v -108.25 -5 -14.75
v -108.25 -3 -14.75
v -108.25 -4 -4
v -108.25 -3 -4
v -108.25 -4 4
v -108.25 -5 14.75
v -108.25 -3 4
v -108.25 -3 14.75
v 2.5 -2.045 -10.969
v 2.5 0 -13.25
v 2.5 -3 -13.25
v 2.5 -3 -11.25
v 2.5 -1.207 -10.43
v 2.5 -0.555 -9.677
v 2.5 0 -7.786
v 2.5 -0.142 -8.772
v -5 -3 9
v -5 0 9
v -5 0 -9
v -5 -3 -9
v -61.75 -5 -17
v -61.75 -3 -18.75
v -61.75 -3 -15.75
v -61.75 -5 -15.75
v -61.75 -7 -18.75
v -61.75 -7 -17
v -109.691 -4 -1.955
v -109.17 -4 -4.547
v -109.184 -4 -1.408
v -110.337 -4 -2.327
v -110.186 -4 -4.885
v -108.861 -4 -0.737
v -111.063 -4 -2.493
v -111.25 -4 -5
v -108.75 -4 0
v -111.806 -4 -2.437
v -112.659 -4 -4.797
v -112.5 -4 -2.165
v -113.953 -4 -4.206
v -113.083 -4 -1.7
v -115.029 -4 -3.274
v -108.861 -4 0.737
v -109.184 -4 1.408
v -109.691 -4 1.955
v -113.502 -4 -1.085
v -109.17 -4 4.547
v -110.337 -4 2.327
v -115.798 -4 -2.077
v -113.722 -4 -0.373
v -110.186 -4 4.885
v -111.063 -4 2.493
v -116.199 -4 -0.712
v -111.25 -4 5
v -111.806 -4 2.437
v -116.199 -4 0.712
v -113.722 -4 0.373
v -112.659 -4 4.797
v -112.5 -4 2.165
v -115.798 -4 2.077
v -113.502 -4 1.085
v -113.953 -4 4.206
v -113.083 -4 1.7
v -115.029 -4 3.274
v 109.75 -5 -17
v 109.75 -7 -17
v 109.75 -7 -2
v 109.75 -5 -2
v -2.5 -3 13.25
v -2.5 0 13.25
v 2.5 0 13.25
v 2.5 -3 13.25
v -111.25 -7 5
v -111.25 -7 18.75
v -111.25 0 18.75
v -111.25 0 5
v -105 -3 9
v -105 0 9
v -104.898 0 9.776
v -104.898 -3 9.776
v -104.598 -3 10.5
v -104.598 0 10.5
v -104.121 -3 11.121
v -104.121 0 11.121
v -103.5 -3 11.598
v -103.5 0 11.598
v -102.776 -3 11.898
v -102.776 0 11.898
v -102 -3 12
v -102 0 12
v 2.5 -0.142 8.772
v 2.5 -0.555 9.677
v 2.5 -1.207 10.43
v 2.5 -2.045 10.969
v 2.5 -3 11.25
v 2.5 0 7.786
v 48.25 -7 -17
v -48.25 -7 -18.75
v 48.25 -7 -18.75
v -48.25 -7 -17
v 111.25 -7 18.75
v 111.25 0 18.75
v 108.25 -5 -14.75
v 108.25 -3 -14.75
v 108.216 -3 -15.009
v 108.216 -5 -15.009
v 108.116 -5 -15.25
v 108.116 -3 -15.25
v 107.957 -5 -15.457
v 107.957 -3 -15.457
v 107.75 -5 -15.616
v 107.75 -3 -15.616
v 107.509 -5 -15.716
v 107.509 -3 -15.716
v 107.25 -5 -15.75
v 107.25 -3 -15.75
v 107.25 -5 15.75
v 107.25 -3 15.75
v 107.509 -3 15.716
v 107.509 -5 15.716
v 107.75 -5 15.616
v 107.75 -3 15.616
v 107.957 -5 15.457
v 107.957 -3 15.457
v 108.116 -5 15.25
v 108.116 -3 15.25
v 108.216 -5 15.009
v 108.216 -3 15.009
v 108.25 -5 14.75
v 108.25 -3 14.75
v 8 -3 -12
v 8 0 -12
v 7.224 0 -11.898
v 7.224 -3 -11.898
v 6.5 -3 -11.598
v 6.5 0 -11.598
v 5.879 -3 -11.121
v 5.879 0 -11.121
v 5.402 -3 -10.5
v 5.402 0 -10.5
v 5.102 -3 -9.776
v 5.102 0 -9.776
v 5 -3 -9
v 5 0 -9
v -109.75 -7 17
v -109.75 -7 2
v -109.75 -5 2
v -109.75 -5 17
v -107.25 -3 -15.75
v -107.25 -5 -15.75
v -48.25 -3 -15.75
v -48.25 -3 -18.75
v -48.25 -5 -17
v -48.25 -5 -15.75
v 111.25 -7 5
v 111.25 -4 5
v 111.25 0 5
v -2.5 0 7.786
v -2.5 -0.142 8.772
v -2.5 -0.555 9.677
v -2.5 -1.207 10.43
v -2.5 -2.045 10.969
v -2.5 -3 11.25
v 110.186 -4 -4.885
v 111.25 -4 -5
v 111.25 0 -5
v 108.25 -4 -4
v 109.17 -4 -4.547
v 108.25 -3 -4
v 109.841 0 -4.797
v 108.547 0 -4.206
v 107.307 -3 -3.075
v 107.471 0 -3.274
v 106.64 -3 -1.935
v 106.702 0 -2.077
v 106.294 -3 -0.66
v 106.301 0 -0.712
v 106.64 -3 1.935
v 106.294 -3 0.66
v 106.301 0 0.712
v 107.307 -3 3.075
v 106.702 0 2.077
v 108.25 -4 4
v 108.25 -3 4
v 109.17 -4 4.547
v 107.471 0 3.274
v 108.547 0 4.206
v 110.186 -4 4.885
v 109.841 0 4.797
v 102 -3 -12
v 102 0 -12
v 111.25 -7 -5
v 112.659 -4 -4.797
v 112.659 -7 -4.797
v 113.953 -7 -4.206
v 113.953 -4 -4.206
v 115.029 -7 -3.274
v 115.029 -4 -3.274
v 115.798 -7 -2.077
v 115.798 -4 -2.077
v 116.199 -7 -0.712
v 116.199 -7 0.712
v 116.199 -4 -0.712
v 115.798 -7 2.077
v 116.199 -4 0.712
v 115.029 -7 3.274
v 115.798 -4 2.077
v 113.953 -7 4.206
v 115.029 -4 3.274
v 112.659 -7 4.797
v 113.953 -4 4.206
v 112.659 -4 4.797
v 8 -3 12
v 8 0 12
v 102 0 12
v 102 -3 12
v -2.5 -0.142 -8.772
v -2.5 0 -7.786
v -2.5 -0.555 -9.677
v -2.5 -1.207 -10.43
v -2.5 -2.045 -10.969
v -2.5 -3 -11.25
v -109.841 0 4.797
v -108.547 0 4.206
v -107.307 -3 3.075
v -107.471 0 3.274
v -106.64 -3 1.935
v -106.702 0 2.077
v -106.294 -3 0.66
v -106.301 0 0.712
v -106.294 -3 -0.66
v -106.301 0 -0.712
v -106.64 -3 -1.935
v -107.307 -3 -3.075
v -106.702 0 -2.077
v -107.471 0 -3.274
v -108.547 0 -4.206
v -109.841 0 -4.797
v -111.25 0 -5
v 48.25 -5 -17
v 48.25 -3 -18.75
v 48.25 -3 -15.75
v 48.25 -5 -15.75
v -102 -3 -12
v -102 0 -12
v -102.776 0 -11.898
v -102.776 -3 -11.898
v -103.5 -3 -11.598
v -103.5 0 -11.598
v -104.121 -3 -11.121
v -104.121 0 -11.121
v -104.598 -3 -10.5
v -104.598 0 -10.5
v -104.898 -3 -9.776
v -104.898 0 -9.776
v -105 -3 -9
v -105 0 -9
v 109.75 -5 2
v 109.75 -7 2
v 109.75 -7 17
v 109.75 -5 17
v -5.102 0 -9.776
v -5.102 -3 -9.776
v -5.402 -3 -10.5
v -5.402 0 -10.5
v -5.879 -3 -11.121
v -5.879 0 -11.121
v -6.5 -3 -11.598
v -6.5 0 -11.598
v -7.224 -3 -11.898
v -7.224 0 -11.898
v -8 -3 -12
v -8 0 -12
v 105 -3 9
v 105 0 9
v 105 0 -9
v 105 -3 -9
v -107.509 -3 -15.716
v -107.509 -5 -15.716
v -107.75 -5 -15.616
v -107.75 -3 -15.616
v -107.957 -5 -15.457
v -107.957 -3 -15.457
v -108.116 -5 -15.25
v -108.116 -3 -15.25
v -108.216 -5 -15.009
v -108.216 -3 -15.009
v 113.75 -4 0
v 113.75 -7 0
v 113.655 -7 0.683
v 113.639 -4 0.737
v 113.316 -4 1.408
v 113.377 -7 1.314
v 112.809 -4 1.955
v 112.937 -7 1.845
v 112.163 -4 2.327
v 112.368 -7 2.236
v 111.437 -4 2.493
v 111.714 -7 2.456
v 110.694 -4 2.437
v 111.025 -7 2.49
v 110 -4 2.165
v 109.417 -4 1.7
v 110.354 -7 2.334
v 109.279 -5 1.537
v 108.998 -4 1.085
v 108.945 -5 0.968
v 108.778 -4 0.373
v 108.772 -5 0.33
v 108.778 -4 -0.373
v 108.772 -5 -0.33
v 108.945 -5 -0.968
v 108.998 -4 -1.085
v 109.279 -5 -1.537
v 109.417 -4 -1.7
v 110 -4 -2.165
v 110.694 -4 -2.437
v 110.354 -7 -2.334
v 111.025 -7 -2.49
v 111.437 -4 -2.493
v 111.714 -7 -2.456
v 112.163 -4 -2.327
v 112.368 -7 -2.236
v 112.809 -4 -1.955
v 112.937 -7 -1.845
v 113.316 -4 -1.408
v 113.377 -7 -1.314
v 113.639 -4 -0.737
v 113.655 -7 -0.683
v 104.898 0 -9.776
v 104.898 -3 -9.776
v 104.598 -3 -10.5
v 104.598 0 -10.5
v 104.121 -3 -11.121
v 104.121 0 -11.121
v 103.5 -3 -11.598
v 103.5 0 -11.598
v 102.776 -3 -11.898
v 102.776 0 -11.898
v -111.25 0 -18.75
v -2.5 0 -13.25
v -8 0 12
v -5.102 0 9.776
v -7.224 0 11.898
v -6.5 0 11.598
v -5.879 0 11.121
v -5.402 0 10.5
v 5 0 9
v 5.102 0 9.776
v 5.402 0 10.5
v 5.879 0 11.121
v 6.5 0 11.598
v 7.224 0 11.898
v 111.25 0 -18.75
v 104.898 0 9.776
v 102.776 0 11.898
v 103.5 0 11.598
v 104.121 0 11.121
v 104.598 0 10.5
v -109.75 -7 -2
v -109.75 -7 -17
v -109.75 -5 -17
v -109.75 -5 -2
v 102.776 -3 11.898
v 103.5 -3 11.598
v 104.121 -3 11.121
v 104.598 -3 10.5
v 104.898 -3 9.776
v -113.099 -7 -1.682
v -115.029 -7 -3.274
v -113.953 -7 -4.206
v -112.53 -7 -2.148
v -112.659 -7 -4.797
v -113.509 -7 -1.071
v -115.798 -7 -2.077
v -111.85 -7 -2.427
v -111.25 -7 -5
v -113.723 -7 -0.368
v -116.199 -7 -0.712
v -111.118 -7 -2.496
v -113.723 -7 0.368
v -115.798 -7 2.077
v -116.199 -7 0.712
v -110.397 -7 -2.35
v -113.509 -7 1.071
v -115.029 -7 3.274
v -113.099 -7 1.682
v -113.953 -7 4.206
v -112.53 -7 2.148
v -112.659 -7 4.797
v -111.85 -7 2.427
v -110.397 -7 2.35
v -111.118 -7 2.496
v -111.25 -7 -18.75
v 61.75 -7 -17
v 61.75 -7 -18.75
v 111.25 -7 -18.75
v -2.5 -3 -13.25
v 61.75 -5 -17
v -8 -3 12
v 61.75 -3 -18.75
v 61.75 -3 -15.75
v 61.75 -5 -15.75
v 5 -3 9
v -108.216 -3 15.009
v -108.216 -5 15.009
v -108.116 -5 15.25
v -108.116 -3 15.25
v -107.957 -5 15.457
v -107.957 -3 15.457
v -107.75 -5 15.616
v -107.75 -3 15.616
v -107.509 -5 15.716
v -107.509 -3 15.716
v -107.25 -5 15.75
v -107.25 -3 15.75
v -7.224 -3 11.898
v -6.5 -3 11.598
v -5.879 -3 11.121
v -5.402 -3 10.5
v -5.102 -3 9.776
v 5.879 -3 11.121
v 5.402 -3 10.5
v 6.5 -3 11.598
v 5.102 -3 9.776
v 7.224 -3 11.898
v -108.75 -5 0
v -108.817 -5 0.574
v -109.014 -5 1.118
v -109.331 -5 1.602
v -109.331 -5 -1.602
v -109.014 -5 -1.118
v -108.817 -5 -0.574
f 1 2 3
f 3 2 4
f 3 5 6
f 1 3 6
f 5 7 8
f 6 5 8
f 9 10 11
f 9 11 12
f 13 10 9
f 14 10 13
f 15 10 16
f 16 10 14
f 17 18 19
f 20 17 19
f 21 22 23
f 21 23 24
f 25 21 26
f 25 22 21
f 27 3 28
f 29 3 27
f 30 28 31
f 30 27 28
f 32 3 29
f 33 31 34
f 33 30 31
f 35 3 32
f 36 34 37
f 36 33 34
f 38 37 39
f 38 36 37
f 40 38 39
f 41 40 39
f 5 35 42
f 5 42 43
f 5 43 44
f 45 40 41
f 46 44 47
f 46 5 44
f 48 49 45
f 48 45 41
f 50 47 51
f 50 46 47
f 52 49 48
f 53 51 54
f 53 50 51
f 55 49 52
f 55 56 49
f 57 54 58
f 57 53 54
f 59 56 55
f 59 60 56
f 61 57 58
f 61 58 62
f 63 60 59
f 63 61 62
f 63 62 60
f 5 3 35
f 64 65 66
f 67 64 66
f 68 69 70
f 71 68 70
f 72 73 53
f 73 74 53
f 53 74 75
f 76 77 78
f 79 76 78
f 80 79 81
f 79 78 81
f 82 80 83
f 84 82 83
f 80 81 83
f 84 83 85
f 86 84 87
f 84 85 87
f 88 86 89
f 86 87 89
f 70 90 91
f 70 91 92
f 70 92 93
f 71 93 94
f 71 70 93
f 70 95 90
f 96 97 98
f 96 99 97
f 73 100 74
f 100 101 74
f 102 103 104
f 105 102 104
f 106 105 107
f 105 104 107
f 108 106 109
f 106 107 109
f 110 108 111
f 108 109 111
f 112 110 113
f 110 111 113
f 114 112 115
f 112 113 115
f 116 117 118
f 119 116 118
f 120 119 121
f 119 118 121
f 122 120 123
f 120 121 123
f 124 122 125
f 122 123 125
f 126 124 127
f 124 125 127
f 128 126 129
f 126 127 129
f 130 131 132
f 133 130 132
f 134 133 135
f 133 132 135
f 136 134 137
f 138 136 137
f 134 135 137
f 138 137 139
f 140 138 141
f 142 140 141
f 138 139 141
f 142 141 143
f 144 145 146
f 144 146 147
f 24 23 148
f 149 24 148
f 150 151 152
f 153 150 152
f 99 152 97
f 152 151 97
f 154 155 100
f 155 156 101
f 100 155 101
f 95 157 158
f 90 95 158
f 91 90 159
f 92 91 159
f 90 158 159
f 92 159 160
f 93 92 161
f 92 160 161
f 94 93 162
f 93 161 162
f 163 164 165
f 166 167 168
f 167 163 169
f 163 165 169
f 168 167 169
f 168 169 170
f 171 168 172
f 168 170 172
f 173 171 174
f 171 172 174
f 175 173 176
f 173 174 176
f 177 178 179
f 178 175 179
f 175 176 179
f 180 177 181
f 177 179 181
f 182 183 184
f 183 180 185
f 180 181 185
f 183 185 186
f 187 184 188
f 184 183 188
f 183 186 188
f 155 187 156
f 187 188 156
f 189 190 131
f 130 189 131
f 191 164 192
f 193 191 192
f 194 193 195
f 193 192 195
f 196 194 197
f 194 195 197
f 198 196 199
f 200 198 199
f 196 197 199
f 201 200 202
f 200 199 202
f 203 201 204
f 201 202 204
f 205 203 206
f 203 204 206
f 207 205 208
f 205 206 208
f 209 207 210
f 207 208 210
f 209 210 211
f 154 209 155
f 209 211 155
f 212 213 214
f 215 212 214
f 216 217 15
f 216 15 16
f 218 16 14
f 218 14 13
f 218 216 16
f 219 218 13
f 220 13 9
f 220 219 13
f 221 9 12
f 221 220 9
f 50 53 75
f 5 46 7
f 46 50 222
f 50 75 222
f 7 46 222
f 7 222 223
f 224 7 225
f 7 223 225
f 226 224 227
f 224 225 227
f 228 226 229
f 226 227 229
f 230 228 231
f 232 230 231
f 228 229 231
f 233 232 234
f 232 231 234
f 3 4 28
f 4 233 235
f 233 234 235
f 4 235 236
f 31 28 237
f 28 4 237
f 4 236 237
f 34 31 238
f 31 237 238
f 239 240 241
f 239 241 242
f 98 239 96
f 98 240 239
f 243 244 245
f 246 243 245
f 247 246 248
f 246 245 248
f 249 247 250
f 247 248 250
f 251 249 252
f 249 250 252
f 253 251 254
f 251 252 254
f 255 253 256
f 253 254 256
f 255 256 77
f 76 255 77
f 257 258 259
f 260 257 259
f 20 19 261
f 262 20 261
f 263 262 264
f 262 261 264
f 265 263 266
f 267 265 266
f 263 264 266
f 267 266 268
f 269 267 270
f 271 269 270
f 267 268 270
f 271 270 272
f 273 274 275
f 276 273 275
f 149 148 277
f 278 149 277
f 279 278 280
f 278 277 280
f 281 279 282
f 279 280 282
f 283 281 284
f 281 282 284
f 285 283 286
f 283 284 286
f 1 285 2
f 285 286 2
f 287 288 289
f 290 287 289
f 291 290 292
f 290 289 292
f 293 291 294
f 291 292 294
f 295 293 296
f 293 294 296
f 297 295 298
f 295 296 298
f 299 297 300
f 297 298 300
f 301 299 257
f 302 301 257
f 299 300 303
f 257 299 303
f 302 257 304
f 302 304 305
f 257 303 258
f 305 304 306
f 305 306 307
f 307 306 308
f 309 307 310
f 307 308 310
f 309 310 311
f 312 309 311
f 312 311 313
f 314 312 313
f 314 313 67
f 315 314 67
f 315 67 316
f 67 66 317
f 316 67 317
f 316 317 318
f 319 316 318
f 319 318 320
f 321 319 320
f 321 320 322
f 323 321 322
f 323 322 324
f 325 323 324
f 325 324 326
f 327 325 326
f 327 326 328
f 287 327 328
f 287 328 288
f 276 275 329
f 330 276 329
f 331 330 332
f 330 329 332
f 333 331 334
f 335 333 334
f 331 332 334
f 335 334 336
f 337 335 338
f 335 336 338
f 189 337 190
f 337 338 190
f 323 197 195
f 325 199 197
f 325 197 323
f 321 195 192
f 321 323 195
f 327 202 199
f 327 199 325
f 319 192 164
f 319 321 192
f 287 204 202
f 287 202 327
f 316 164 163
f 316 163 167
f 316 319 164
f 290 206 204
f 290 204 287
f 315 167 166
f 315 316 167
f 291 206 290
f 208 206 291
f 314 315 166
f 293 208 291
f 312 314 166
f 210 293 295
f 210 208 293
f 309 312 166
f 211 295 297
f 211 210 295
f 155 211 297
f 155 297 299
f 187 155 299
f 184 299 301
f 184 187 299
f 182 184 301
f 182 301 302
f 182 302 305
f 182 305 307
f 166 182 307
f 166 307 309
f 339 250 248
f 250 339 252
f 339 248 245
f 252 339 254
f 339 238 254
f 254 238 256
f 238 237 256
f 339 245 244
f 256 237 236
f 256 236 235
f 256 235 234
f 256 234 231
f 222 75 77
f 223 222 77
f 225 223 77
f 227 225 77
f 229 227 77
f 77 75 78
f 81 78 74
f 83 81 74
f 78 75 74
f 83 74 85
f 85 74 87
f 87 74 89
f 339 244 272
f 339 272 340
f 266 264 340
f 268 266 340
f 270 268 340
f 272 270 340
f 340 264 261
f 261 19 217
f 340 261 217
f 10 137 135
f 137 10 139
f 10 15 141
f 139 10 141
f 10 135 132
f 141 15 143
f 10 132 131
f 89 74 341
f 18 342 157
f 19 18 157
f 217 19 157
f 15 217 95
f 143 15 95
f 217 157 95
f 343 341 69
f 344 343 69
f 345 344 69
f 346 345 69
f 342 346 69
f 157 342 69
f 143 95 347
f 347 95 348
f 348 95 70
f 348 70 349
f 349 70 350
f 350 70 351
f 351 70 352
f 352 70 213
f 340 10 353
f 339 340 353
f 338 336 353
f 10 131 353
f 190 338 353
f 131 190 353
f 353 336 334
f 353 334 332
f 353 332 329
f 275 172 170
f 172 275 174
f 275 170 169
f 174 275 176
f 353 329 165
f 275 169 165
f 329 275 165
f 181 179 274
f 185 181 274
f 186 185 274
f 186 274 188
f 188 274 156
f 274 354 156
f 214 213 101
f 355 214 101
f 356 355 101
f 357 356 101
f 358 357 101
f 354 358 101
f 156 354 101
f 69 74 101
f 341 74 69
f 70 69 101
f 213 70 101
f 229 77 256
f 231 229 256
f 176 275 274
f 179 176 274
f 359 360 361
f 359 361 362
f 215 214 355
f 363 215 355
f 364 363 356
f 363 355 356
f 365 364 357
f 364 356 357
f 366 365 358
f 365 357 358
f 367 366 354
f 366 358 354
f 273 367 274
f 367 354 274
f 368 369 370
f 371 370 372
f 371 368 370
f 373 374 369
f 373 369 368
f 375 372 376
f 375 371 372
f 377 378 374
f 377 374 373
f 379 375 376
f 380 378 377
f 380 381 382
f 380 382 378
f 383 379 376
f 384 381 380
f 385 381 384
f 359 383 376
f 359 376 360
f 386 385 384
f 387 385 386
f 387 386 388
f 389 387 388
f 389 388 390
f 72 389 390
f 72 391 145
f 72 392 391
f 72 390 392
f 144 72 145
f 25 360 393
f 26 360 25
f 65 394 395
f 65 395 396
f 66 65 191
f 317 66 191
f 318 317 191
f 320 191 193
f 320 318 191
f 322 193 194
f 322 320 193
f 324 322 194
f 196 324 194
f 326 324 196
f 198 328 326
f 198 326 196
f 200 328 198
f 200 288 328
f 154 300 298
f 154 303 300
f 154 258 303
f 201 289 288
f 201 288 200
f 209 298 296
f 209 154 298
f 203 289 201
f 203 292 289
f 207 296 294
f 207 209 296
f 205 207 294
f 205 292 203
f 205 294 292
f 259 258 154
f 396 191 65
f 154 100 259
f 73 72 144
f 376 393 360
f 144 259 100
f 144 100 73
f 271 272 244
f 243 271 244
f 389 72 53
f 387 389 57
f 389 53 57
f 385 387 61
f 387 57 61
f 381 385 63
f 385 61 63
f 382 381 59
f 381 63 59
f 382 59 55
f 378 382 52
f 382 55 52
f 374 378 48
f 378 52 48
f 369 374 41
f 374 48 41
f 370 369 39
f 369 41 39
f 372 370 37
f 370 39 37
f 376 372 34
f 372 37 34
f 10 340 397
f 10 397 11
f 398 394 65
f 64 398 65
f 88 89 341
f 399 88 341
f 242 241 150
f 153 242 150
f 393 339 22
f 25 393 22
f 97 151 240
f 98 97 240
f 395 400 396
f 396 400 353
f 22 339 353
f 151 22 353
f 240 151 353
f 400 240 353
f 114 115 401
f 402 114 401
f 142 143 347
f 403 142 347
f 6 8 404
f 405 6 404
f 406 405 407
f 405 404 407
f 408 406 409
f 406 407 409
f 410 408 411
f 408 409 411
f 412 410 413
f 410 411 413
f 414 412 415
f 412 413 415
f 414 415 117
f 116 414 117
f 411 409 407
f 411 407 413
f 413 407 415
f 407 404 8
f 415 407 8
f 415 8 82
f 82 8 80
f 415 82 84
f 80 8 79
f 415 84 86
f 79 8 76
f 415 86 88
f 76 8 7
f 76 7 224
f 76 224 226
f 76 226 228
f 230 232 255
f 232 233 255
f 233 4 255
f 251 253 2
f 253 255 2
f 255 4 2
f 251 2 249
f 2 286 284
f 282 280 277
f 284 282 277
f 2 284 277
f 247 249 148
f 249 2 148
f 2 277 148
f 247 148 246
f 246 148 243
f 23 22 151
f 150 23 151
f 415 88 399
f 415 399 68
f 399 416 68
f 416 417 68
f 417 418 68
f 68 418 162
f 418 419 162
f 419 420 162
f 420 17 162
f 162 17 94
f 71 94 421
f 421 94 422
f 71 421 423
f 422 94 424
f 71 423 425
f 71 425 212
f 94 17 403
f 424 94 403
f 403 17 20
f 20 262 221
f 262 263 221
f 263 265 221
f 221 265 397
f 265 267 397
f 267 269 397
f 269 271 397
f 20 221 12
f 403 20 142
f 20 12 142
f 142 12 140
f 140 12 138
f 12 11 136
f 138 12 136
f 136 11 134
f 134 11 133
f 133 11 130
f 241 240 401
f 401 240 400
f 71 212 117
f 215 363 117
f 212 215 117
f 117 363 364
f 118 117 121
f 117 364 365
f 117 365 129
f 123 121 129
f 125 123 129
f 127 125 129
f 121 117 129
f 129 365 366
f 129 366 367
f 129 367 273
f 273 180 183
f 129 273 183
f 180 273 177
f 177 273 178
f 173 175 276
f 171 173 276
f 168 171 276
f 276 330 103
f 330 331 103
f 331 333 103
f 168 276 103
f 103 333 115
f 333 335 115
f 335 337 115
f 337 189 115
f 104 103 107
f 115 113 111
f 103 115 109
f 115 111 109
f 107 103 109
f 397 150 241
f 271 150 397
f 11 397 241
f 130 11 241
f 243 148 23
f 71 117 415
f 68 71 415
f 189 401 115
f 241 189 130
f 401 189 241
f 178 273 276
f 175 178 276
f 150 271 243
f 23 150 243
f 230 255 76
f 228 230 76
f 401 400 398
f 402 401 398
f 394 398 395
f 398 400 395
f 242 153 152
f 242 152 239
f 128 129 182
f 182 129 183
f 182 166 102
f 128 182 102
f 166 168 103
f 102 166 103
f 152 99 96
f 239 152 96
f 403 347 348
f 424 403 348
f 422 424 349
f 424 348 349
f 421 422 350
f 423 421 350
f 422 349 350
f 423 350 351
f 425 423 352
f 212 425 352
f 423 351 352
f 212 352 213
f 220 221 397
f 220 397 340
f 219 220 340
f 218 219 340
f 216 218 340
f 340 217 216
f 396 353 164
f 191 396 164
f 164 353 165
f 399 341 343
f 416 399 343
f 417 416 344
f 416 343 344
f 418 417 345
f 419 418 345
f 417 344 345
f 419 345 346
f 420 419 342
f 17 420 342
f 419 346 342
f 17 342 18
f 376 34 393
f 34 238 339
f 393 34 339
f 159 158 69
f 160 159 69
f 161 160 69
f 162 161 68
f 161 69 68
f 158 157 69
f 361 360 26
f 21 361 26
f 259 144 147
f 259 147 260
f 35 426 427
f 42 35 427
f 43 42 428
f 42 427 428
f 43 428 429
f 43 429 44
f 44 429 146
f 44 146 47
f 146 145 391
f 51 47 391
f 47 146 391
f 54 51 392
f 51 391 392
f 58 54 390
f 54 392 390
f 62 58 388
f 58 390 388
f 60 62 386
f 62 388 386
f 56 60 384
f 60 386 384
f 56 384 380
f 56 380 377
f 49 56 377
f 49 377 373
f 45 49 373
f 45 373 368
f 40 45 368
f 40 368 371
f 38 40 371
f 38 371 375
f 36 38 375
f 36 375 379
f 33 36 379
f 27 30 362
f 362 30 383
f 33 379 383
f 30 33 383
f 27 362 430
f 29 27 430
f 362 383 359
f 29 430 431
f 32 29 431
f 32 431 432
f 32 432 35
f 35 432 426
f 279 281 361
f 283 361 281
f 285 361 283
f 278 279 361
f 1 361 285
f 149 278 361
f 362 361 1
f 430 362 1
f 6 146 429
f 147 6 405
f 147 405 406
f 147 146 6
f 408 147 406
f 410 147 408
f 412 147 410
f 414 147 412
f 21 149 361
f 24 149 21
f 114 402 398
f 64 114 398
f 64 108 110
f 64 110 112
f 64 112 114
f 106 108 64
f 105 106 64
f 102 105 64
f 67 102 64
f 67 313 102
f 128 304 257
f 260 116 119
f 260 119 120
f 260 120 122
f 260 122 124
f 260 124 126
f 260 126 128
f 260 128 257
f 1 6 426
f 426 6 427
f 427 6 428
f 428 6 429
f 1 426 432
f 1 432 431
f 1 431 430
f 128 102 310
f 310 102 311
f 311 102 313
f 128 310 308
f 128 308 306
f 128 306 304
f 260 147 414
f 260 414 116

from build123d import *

# Parameters (mm, degrees)
F0_W         = 5
F0_H         = 2
F1_DEPTH     = 3
F2_R         = 2
F3_DEPTH     = 4
F4_W         = 219.5
F4_H         = 34
F4_W_2       = 214.53166008
F4_H_2       = 28.9933998138
F5_DEPTH     = 2
F6_R         = 2.5
F7_DEPTH     = 7.001
F8_R         = 5
F9_DEPTH     = 4
F10_W        = 13.5
F10_H        = 4
F11_DEPTH    = 25
F12_T1_DEPTH = 5


# Not quite as in the source:
# - a fillet or chamfer that OpenCascade refuses, or shapes differently, is made with other operations: its cross-section is extruded or revolved along the edge and cut away or added
# - a feature names something its author has since deleted; it is built from what else it names


with BuildPart() as f1:
    # F0 (on Front) → F1 (new body)
    with BuildSketch(Plane.XZ):
        Polygon((111.25, 5), (111.25, 18.75), (-111.25, 18.75), (-111.25, 5), (-111.25, -5), (-111.25, -18.75), (111.25, -18.75), (111.25, -5), align=None)
        with Locations((0, -12.25)):
            Rectangle(F0_W, F0_H, mode=Mode.SUBTRACT)
        with BuildLine():
            Line((-102, 12), (-8, 12))
            ThreePointArc((-8, 12), (-5.8786796564, 11.1213203436), (-5, 9))
            Line((-5, 9), (-5, -9))
            ThreePointArc((-5, -9), (-5.8786796564, -11.1213203436), (-8, -12))
            Line((-8, -12), (-102, -12))
            ThreePointArc((-102, -12), (-104.1213203436, -11.1213203436), (-105, -9))
            Line((-105, -9), (-105, 9))
            ThreePointArc((-105, 9), (-104.1213203436, 11.1213203436), (-102, 12))
        make_face(mode=Mode.SUBTRACT)
        with BuildLine():
            Line((8, 12), (102, 12))
            ThreePointArc((102, 12), (104.1213203436, 11.1213203436), (105, 9))
            Line((105, 9), (105, -9))
            ThreePointArc((105, -9), (104.1213203436, -11.1213203436), (102, -12))
            Line((102, -12), (8, -12))
            ThreePointArc((8, -12), (5.8786796564, -11.1213203436), (5, -9))
            Line((5, -9), (5, 9))
            ThreePointArc((5, 9), (5.8786796564, 11.1213203436), (8, 12))
        make_face(mode=Mode.SUBTRACT)
        with Locations((0, 12.25)):
            Rectangle(F0_W, F0_H, mode=Mode.SUBTRACT)
        with BuildLine():
            ThreePointArc((111.25, -5), (116.25, 0), (111.25, 5))
            Line((111.25, 5), (111.25, -5))
        make_face()
        with BuildLine():
            Line((-111.25, -5), (-111.25, 5))
            ThreePointArc((-111.25, 5), (-116.25, 0), (-111.25, -5))
        make_face()
    extrude(amount=F1_DEPTH)

    # F2 (on face) → F3 (join)
    with BuildSketch(Plane.XZ.offset(3)):
        with BuildLine():
            ThreePointArc((111.25, -5), (116.25, 0), (111.25, 5))
            Line((111.25, 5), (111.25, 18.75))
            Line((111.25, 18.75), (-111.25, 18.75))
            Line((-111.25, 18.75), (-111.25, 5))
            ThreePointArc((-111.25, 5), (-116.25, 0), (-111.25, -5))
            Line((-111.25, -5), (-111.25, -18.75))
            Line((-111.25, -18.75), (111.25, -18.75))
            Line((111.25, -18.75), (111.25, -5))
        make_face()
        with Locations((-111.25, 0)):
            Circle(F2_R, mode=Mode.SUBTRACT)
        with BuildLine():
            Line((-107.25, 15.75), (107.25, 15.75))
            ThreePointArc((107.25, 15.75), (107.9571067812, 15.4571067812), (108.25, 14.75))
            Line((108.25, 14.75), (108.25, -14.75))
            ThreePointArc((108.25, -14.75), (107.9571067812, -15.4571067812), (107.25, -15.75))
            Line((107.25, -15.75), (-107.25, -15.75))
            ThreePointArc((-107.25, -15.75), (-107.9571067812, -15.4571067812), (-108.25, -14.75))
            Line((-108.25, -14.75), (-108.25, 14.75))
            ThreePointArc((-108.25, 14.75), (-107.9571067812, 15.4571067812), (-107.25, 15.75))
        make_face(mode=Mode.SUBTRACT)
        with Locations((111.25, 0)):
            Circle(F2_R, mode=Mode.SUBTRACT)
    extrude(amount=F3_DEPTH)

    # F4 (on face) → F5 (cut)
    with BuildSketch(Plane.XZ.offset(7)):
        Rectangle(F4_W, F4_H)
        Rectangle(F4_W_2, F4_H_2, mode=Mode.SUBTRACT)
    extrude(amount=-F5_DEPTH, mode=Mode.SUBTRACT)

    # F6 (on face) → F7 (cut, through all)
    with BuildSketch(Plane.XZ.offset(7)):
        with Locations((-111.25, 0)):
            Circle(F6_R)
        with Locations((111.25, 0)):
            Circle(F6_R)
    extrude(amount=-F7_DEPTH, mode=Mode.SUBTRACT)

    # F8 (on face) → F9 (cut)
    with BuildSketch(Plane(origin=(0, 0, 0), x_dir=(-1, 0, 0), z_dir=(0, 1, 0))):
        with Locations((-111.25, 0)):
            Circle(F8_R)
        with Locations((111.25, 0)):
            Circle(F8_R)
    extrude(amount=-F9_DEPTH, mode=Mode.SUBTRACT)

    # F10 (on face) → F11 (cut)
    with BuildSketch(Plane(origin=(0, 0, -18.75), x_dir=(1, 0, 0), z_dir=(0, 0, -1))):
        with Locations((-55, 5)):
            Rectangle(F10_W, F10_H)
        with Locations((55, 5)):
            Rectangle(F10_W, F10_H)
    extrude(amount=-F11_DEPTH, mode=Mode.SUBTRACT)

    # F12: fillet of radius 3.5 on 2 edges, made by hand

    # F12_s2 → F12_t1 (cut)
    with BuildSketch(Plane.YZ.offset(-2.5)):
        with BuildLine():
            ThreePointArc((0, 7.7858983849), (-0.8542486889, 10.0771862323), (-3, 11.25))
            Line((-3, 11.25), (0, 11.25))
            Line((0, 11.25), (0, 7.7858983849))
        make_face()
        with BuildLine():
            ThreePointArc((0, -7.7858983849), (-0.8542486889, -10.0771862323), (-3, -11.25))
            Line((-3, -11.25), (0, -11.25))
            Line((0, -11.25), (0, -7.7858983849))
        make_face()
    extrude(amount=F12_T1_DEPTH, mode=Mode.SUBTRACT)


solid = f1.part
